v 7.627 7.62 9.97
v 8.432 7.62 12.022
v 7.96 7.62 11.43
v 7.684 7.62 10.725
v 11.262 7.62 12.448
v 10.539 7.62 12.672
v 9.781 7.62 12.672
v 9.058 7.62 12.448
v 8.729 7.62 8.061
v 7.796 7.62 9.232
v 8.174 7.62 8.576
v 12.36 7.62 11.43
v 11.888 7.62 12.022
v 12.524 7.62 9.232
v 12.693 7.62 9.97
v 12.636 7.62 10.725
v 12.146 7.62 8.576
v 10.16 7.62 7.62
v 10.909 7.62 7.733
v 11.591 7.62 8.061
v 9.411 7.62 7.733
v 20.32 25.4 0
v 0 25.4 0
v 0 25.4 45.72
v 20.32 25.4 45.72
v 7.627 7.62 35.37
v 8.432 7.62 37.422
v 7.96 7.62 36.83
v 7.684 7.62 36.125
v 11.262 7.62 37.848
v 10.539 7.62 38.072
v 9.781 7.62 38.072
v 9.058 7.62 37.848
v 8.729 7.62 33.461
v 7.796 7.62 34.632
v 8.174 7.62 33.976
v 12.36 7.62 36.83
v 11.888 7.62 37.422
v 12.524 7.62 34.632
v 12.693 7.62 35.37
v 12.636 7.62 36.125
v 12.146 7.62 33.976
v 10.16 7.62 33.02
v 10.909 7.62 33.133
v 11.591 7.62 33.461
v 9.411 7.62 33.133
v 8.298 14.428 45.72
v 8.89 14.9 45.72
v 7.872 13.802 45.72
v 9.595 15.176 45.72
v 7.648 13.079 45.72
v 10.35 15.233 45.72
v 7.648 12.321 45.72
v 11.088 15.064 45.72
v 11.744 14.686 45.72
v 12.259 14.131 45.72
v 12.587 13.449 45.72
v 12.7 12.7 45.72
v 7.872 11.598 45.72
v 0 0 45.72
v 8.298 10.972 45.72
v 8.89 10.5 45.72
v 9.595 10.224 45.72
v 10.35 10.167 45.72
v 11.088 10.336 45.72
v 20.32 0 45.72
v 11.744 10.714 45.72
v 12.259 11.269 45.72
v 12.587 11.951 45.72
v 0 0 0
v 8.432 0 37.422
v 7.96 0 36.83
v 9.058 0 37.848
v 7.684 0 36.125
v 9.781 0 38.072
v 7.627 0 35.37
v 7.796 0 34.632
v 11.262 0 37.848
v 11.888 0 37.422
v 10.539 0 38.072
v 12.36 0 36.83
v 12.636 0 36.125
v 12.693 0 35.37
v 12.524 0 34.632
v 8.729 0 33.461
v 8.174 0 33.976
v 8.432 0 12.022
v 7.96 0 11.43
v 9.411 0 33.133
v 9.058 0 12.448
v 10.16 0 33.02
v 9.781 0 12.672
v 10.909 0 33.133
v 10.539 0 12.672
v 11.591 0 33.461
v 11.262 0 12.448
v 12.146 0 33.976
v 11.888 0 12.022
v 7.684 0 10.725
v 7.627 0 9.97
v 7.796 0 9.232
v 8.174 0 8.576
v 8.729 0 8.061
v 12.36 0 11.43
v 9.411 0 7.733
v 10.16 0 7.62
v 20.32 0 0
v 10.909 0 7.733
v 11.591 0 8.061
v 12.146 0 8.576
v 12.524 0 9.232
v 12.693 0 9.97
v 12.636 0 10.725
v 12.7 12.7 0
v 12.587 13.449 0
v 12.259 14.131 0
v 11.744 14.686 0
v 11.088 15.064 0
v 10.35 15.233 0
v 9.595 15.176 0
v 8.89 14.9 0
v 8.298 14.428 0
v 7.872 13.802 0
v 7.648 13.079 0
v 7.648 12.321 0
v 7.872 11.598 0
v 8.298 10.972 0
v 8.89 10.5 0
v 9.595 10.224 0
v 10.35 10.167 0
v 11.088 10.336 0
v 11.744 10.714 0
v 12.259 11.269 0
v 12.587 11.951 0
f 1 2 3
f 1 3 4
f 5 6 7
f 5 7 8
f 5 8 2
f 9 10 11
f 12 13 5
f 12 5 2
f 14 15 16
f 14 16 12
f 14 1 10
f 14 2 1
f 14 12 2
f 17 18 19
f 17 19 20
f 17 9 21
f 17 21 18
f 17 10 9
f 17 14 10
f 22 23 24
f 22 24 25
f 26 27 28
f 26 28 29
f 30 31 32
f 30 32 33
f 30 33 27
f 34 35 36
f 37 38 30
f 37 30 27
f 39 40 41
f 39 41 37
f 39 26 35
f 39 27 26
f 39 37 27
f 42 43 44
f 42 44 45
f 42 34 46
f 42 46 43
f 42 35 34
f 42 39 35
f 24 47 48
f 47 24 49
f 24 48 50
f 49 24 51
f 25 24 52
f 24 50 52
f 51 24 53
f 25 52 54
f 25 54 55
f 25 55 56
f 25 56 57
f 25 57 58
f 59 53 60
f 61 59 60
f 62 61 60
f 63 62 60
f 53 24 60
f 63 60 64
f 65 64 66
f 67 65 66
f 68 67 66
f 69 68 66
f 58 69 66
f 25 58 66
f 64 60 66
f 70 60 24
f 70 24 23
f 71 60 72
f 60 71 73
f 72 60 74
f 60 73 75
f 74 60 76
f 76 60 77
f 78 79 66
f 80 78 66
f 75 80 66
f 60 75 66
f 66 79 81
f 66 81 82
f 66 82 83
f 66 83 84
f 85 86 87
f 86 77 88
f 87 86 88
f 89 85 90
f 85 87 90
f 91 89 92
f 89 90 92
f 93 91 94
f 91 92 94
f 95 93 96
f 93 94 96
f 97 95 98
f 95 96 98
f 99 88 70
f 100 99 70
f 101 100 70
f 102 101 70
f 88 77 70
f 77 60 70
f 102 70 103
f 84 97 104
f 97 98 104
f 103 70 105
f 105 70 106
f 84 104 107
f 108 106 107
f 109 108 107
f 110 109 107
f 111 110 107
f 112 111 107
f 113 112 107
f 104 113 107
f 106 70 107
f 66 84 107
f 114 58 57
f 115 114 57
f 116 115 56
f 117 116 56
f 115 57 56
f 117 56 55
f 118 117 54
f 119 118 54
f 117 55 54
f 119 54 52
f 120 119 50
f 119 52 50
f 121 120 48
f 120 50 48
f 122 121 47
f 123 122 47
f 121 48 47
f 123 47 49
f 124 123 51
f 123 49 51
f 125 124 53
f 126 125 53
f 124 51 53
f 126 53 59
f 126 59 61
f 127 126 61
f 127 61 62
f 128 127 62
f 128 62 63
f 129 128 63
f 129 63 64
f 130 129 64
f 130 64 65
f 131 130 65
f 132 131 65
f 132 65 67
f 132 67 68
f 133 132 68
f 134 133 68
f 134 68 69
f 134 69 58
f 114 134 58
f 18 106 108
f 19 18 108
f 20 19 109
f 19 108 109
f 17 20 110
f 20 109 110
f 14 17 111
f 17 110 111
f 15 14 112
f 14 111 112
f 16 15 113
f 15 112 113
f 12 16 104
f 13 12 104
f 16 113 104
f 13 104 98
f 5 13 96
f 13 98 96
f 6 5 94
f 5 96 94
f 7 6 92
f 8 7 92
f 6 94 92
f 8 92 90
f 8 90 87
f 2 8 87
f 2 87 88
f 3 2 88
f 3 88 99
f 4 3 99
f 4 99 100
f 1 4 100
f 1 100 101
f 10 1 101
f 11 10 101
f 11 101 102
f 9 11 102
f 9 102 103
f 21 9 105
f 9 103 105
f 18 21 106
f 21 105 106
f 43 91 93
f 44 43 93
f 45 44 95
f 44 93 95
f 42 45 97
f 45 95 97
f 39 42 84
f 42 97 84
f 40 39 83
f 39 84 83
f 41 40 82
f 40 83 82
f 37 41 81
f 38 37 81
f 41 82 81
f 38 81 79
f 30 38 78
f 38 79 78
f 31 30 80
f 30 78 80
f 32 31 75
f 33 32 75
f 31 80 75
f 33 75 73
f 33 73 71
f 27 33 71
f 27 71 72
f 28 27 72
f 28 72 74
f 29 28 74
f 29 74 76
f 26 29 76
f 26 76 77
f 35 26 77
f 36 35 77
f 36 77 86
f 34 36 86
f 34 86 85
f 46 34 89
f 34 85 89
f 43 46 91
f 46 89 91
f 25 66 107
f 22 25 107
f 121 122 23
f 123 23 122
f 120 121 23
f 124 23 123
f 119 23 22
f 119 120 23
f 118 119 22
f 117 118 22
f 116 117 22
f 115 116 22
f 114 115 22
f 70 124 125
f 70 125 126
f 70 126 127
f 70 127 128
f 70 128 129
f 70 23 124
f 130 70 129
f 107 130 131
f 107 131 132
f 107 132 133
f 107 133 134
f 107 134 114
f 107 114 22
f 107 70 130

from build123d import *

# Parameters (mm, degrees)
SKETCH1_W           = 20.32
SKETCH1_H           = 45.72
BOSS_EXTRUDE1_DEPTH = 25.4
SKETCH2_R           = 2.54
CUT_EXTRUDE1_DEPTH  = 57.110433967
SKETCH3_R           = 2.54
CUT_EXTRUDE2_DEPTH  = 7.62


with BuildPart() as part:
    # Sketch1 → Boss-Extrude1 (new body)
    with BuildSketch(Plane(origin=(0, 0, 0), x_dir=(1, 0, 0), z_dir=(0, 1, 0))):
        with Locations((10.16, -22.86)):
            Rectangle(SKETCH1_W, SKETCH1_H)
    extrude(amount=BOSS_EXTRUDE1_DEPTH)

    # Sketch2 → Cut-Extrude1 (cut, through all)
    with BuildSketch(Plane.XY.offset(45.72)):
        with Locations((10.16, 12.7)):
            Circle(SKETCH2_R)
    extrude(amount=-CUT_EXTRUDE1_DEPTH, mode=Mode.SUBTRACT)

    # Sketch3 → Cut-Extrude2 (cut)
    with BuildSketch(Plane(origin=(0, 0, 0), x_dir=(-1, 0, 0), z_dir=(0, -1, 0))):
        with Locations(Location((-10.16, -35.56, 0), (0, 0, 90))):
            Circle(SKETCH3_R)
        with Locations(Location((-10.16, -10.16, 0), (0, 0, 90))):
            Circle(SKETCH3_R)
    extrude(amount=-CUT_EXTRUDE2_DEPTH, mode=Mode.SUBTRACT)


solid = part.part
